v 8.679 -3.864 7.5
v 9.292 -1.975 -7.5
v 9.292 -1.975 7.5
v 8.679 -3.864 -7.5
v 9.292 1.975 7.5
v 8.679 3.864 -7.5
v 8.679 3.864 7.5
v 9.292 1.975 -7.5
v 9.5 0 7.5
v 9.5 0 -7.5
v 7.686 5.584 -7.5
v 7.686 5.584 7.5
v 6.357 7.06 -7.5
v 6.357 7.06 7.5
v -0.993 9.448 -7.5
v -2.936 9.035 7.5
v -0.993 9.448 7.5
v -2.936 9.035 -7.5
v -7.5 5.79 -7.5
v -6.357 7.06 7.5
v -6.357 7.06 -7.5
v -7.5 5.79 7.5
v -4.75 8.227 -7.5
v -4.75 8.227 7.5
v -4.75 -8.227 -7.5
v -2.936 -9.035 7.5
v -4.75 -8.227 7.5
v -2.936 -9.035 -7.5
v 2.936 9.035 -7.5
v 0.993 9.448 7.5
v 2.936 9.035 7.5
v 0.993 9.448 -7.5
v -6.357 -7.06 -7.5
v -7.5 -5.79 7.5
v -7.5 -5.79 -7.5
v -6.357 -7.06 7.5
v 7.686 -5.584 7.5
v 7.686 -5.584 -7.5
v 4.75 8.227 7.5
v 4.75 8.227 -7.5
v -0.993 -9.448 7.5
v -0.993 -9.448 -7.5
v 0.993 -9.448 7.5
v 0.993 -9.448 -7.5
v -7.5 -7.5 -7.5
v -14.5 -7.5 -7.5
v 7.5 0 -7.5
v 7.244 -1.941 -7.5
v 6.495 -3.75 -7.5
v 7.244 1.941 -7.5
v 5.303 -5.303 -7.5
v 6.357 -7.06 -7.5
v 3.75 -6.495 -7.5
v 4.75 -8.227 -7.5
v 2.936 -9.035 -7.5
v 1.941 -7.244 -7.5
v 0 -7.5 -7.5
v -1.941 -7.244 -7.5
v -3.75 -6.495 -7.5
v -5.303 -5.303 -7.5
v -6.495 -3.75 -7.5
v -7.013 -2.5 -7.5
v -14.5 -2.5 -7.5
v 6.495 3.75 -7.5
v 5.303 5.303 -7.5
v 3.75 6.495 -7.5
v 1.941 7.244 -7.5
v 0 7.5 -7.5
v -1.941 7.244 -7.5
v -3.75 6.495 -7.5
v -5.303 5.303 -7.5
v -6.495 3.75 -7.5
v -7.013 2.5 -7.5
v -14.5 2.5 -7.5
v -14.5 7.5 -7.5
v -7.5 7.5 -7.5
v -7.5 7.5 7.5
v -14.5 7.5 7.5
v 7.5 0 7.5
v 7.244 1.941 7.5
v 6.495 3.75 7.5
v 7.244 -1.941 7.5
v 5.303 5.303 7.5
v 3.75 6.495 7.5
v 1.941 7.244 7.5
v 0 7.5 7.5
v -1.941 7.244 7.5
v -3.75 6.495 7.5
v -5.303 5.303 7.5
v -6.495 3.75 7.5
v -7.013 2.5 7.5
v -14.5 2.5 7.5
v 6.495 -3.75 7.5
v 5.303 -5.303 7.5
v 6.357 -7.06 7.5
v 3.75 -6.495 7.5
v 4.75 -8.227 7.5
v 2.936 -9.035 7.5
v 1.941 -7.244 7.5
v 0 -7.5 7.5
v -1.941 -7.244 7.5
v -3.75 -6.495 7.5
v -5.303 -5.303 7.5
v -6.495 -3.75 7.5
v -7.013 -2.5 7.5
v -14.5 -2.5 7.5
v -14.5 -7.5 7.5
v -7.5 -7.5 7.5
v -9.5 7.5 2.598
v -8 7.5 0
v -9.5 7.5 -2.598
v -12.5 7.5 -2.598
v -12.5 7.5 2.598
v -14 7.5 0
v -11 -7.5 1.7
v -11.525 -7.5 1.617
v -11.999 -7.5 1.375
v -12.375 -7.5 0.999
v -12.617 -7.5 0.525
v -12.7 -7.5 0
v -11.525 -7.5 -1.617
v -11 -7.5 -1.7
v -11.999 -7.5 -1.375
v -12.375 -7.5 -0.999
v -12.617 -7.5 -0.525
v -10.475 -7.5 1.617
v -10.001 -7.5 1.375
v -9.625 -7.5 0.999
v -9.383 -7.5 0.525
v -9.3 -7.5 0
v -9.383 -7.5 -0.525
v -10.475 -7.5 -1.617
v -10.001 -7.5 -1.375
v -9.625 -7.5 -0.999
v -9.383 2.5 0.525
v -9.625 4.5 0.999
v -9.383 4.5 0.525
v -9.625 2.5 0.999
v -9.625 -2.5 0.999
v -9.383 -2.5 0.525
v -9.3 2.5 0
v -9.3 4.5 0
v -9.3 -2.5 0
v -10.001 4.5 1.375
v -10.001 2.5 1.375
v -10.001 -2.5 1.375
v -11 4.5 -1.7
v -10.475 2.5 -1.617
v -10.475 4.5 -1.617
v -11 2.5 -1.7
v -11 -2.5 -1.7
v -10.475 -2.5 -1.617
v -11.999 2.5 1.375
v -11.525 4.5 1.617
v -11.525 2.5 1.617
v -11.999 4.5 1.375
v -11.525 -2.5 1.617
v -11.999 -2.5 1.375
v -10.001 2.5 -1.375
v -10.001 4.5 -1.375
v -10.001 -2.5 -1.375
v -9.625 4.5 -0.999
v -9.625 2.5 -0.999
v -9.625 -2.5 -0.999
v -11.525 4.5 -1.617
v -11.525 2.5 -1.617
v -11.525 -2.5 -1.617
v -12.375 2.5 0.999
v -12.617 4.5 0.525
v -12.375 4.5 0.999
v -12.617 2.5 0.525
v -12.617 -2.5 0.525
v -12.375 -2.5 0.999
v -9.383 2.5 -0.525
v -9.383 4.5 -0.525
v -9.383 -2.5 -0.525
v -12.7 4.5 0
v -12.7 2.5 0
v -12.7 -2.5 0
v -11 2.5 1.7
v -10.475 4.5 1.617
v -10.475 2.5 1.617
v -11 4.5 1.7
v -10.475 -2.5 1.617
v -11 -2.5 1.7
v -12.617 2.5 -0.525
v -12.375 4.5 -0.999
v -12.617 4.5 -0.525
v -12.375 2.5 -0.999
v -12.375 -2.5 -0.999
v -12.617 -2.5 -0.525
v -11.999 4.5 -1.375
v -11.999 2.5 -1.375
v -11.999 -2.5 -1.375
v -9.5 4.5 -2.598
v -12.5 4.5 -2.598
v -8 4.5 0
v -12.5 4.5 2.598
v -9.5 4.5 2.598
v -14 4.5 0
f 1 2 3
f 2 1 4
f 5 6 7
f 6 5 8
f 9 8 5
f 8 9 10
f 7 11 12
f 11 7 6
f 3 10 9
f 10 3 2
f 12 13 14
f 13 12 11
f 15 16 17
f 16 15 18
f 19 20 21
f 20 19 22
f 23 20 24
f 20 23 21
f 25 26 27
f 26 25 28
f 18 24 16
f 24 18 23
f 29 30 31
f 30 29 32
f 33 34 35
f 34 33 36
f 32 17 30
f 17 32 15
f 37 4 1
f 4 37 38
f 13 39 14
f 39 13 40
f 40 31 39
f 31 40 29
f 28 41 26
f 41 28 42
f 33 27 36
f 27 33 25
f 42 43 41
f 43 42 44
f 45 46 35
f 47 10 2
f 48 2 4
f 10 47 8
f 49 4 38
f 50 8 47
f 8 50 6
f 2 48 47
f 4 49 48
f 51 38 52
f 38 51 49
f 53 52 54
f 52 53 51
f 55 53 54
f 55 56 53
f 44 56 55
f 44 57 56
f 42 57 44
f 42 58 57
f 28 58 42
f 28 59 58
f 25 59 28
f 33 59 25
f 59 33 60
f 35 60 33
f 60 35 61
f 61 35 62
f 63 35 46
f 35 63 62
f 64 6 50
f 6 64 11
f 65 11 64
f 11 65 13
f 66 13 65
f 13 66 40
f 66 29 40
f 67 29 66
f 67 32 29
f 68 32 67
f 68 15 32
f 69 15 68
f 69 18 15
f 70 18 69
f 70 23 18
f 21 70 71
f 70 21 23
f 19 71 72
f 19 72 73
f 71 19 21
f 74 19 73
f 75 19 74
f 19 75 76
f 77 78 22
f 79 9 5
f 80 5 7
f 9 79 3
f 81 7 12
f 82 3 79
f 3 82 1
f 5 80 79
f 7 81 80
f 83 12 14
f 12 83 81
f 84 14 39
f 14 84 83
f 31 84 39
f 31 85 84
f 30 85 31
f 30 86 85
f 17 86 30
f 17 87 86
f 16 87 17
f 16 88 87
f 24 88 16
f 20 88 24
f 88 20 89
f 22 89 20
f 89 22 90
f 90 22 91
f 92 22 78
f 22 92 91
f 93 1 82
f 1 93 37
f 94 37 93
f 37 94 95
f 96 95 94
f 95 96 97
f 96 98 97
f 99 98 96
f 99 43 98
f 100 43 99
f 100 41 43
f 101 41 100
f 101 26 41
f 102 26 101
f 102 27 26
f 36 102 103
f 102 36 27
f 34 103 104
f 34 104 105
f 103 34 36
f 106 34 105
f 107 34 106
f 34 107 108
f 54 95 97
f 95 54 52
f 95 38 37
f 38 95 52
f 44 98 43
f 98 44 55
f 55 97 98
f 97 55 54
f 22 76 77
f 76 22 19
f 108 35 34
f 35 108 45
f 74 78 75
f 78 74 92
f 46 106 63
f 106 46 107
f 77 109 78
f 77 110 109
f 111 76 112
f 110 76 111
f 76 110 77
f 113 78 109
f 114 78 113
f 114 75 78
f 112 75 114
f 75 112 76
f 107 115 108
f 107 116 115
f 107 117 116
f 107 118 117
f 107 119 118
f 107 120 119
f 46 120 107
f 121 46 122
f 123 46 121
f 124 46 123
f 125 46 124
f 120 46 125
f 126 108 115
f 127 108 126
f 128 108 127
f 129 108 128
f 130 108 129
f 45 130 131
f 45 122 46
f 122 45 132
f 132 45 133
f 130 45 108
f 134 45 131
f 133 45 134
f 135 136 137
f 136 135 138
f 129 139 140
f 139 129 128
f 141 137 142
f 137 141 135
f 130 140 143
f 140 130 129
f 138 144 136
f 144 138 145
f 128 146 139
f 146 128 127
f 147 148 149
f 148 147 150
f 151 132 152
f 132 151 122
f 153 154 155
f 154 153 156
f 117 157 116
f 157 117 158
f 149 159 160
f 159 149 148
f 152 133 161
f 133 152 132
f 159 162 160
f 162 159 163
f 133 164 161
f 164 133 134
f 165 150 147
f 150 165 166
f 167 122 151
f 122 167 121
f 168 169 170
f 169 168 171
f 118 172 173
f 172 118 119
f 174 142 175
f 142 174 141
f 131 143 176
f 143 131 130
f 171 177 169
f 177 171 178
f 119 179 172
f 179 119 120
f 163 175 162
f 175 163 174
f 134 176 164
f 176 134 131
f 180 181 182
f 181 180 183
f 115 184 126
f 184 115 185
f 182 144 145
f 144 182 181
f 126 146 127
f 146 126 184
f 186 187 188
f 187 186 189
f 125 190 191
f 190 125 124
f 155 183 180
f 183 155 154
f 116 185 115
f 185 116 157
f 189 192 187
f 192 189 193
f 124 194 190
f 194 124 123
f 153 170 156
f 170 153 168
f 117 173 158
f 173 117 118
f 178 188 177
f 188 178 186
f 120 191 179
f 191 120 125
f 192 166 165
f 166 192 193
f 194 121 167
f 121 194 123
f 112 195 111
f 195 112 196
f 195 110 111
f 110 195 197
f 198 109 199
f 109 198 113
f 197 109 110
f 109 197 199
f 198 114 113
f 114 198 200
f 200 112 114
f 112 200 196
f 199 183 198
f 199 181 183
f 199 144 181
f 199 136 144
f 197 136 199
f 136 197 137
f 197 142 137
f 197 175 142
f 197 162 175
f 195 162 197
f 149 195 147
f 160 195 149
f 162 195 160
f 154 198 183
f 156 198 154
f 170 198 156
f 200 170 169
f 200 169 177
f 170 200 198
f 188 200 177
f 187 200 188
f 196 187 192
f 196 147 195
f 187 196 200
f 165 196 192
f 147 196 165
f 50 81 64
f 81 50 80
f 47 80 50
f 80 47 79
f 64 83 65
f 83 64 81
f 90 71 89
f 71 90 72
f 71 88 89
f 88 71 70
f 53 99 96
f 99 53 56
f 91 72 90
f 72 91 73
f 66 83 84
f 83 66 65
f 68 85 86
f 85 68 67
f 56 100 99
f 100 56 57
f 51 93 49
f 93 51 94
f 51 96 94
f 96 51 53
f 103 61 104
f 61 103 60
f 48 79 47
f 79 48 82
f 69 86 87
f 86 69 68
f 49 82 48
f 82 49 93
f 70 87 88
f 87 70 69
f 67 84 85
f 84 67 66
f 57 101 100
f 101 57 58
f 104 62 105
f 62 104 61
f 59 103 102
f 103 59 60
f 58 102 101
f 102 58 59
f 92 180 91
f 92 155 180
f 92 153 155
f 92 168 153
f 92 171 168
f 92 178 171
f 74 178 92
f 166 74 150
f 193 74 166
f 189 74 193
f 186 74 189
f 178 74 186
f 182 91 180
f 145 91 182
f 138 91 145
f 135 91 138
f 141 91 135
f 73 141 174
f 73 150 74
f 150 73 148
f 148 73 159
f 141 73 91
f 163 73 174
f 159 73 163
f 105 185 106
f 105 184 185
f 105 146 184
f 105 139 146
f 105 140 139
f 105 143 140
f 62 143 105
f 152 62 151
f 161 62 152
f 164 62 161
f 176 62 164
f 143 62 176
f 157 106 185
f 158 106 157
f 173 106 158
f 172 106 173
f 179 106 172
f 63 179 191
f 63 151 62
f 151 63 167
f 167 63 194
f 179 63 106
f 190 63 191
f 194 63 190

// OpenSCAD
//Parametric clamp

/*
[Parametric Clamp](https://www.thingiverse.com/thing:31982) by [pgreenland](http://www.thingiverse.com/pgreenland) is licensed under the [Creative Commons - Attribution - Share Alike license](http://creativecommons.org/licenses/by-sa/3.0/).
*/

/*
Parameters:
	base : Enable / disable clamp base
	base_thickness : Thickness of clamp base if enabled
	base_width : Width of clamp base if enabled
	ring_thickness : Tickness of clamp ring
	ring_inner_dia : Inner diameter of clamp ring
	jaws_thickness : Thickness of clamp jaws
	jaws_width : Width of clamp jaws
	break_width : Width of break in clamp jaws
	screw_diameter : Screw hole diameter
	screw_count : Screw hole count
	nut_recess : Enable / disable nut recess in clamp
	nut_diameter : Nut recess diameter
	nut_thickness : Nut recess depth
	height : Clamp height
*/

clamp(base = false);
// clamp(screw_count = 2);
// clamp(height = 25);

module clamp(base = true, base_thickness = 2, base_width = 20, ring_thickness = 2, ring_inner_dia = 15, jaws_thickness = 5, jaws_width = 7, break_width = 5, screw_diameter = 3.4, screw_count = 1, nut_recess = true, nut_diameter = 6, nut_thickness = 3, height = 15) {

	//Check base thickness
	if(base && base_thickness < ring_thickness)
		echo("Base thickness must be at least ring thickness, ring will protrude through base");

	//Check jaws width
	if(jaws_width < ring_thickness)
		echo("Jaw width must be at least ring thickness, ring will protrude through jaws");

	//Calculate ring inner radius
	ring_inner_rad = ring_inner_dia / 2;

	//Calculate screw spacing
	screw_spacing = (height - (screw_diameter * screw_count)) / (screw_count + 1);

	//Base
	if(base)
		translate([ring_inner_rad + (base_thickness / 2), 0, 0])
			cube([base_thickness, base_width, height], center=true);

	//Clamp
	difference() {
		union() {
			//Outer cylinder
			cylinder(r=ring_inner_rad + ring_thickness, h=height, center=true);

			//Jaws
			translate([0 - ring_inner_rad - (jaws_width / 2), 0, 0])
				cube([jaws_width, (jaws_thickness * 2) + break_width, height], center=true);
		}
	
		//Inner cylinder
		cylinder(r=ring_inner_rad, h=height + 10, center=true);

		//Break
		translate([0 - ((jaws_width + ring_thickness + (ring_inner_dia / 2) + 10) / 2), 0, 0])
			cube([jaws_width + ring_thickness + (ring_inner_dia / 2) + 10, break_width, height + 10], center=true);

		//Screw hole(s)
		for(i = [1 : screw_count])
			translate([0 - (ring_inner_dia / 2) - (jaws_width / 2), 0, (height / 2) - (screw_diameter / 2) - (screw_spacing * i) - (screw_diameter * (i - 1))])
				rotate([90, 0, 0])
					union() {
						cylinder(r=screw_diameter / 2, h=jaws_thickness * 2 + break_width + 10, center=true, $fn=20);
						if(nut_recess) translate([0, 0, nut_thickness-((nut_thickness + 10)/2)-(break_width/2)-jaws_thickness]) cylinder(r=nut_diameter/2, h=nut_thickness + 10, center=true, $fn=6);
					}
	}
}
